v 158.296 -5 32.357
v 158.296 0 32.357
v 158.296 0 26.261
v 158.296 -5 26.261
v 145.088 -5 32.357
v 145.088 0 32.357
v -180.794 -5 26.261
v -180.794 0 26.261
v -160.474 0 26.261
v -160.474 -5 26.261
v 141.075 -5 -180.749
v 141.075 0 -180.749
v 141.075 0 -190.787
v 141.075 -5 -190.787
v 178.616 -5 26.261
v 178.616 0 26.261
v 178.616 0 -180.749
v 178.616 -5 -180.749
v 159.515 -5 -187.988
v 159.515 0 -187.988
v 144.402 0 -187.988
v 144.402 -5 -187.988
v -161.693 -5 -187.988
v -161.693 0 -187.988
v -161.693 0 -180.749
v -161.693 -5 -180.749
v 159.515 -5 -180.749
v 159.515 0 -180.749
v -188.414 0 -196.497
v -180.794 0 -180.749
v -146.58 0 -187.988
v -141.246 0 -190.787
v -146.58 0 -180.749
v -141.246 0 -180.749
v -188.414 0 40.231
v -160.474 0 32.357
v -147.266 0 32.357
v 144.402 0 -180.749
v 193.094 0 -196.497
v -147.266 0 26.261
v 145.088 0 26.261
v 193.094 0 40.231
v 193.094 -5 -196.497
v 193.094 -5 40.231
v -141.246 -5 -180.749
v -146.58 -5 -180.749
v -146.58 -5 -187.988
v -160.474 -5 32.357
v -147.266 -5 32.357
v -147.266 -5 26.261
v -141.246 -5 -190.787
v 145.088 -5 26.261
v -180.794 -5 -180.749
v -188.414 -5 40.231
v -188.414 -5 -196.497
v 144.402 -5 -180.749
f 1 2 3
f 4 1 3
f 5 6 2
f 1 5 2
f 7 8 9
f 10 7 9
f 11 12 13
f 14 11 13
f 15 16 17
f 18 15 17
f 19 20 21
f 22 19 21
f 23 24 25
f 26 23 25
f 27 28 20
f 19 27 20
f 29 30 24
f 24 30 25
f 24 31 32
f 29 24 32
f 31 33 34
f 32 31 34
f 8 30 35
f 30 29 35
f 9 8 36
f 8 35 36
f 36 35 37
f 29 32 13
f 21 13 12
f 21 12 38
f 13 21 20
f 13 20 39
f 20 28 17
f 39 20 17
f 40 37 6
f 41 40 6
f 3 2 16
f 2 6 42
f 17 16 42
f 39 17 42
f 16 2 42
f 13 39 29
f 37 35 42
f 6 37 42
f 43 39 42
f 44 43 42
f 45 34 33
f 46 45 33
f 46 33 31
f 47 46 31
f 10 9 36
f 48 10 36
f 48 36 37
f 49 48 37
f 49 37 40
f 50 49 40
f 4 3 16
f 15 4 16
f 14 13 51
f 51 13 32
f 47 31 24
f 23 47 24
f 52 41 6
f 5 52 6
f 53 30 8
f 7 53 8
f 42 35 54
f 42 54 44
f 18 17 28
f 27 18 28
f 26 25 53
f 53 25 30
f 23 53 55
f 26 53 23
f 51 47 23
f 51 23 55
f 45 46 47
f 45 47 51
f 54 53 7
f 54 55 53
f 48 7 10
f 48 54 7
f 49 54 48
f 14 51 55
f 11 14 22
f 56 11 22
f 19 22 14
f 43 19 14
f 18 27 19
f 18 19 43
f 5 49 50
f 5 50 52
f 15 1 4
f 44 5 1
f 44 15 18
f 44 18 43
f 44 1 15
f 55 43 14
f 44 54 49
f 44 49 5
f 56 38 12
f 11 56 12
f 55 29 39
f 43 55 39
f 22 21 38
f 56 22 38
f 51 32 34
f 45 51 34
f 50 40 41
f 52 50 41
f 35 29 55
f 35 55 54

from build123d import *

# Parameters (mm, degrees)
F0_W     = 381.508
F0_H     = 236.728
F1_DEPTH = 5


with BuildPart() as f1:
    # F0 (on Front) → F1 (new body)
    with BuildSketch(Plane.XZ):
        with Locations((2.340291, -78.132914)):
            Rectangle(F0_W, F0_H)
        Polygon((-180.793709, -180.748914), (-180.793709, 26.261086), (-160.473709, 26.261086), (-160.473709, 32.357086), (-147.265709, 32.357086), (-147.265709, 26.261086), (145.088291, 26.261086), (145.088291, 32.357086), (158.296291, 32.357086), (158.296291, 26.261086), (178.616291, 26.261086), (178.616291, -180.748914), (159.515491, -180.748914), (159.515491, -187.987914), (144.402491, -187.987914), (144.402491, -180.748914), (141.075091, -180.748914), (141.075091, -190.786994), (-141.245909, -190.786994), (-141.245909, -180.748914), (-146.579909, -180.748914), (-146.579909, -187.987914), (-161.692909, -187.987914), (-161.692909, -180.748914), align=None, mode=Mode.SUBTRACT)
    extrude(amount=F1_DEPTH)


solid = f1.part
